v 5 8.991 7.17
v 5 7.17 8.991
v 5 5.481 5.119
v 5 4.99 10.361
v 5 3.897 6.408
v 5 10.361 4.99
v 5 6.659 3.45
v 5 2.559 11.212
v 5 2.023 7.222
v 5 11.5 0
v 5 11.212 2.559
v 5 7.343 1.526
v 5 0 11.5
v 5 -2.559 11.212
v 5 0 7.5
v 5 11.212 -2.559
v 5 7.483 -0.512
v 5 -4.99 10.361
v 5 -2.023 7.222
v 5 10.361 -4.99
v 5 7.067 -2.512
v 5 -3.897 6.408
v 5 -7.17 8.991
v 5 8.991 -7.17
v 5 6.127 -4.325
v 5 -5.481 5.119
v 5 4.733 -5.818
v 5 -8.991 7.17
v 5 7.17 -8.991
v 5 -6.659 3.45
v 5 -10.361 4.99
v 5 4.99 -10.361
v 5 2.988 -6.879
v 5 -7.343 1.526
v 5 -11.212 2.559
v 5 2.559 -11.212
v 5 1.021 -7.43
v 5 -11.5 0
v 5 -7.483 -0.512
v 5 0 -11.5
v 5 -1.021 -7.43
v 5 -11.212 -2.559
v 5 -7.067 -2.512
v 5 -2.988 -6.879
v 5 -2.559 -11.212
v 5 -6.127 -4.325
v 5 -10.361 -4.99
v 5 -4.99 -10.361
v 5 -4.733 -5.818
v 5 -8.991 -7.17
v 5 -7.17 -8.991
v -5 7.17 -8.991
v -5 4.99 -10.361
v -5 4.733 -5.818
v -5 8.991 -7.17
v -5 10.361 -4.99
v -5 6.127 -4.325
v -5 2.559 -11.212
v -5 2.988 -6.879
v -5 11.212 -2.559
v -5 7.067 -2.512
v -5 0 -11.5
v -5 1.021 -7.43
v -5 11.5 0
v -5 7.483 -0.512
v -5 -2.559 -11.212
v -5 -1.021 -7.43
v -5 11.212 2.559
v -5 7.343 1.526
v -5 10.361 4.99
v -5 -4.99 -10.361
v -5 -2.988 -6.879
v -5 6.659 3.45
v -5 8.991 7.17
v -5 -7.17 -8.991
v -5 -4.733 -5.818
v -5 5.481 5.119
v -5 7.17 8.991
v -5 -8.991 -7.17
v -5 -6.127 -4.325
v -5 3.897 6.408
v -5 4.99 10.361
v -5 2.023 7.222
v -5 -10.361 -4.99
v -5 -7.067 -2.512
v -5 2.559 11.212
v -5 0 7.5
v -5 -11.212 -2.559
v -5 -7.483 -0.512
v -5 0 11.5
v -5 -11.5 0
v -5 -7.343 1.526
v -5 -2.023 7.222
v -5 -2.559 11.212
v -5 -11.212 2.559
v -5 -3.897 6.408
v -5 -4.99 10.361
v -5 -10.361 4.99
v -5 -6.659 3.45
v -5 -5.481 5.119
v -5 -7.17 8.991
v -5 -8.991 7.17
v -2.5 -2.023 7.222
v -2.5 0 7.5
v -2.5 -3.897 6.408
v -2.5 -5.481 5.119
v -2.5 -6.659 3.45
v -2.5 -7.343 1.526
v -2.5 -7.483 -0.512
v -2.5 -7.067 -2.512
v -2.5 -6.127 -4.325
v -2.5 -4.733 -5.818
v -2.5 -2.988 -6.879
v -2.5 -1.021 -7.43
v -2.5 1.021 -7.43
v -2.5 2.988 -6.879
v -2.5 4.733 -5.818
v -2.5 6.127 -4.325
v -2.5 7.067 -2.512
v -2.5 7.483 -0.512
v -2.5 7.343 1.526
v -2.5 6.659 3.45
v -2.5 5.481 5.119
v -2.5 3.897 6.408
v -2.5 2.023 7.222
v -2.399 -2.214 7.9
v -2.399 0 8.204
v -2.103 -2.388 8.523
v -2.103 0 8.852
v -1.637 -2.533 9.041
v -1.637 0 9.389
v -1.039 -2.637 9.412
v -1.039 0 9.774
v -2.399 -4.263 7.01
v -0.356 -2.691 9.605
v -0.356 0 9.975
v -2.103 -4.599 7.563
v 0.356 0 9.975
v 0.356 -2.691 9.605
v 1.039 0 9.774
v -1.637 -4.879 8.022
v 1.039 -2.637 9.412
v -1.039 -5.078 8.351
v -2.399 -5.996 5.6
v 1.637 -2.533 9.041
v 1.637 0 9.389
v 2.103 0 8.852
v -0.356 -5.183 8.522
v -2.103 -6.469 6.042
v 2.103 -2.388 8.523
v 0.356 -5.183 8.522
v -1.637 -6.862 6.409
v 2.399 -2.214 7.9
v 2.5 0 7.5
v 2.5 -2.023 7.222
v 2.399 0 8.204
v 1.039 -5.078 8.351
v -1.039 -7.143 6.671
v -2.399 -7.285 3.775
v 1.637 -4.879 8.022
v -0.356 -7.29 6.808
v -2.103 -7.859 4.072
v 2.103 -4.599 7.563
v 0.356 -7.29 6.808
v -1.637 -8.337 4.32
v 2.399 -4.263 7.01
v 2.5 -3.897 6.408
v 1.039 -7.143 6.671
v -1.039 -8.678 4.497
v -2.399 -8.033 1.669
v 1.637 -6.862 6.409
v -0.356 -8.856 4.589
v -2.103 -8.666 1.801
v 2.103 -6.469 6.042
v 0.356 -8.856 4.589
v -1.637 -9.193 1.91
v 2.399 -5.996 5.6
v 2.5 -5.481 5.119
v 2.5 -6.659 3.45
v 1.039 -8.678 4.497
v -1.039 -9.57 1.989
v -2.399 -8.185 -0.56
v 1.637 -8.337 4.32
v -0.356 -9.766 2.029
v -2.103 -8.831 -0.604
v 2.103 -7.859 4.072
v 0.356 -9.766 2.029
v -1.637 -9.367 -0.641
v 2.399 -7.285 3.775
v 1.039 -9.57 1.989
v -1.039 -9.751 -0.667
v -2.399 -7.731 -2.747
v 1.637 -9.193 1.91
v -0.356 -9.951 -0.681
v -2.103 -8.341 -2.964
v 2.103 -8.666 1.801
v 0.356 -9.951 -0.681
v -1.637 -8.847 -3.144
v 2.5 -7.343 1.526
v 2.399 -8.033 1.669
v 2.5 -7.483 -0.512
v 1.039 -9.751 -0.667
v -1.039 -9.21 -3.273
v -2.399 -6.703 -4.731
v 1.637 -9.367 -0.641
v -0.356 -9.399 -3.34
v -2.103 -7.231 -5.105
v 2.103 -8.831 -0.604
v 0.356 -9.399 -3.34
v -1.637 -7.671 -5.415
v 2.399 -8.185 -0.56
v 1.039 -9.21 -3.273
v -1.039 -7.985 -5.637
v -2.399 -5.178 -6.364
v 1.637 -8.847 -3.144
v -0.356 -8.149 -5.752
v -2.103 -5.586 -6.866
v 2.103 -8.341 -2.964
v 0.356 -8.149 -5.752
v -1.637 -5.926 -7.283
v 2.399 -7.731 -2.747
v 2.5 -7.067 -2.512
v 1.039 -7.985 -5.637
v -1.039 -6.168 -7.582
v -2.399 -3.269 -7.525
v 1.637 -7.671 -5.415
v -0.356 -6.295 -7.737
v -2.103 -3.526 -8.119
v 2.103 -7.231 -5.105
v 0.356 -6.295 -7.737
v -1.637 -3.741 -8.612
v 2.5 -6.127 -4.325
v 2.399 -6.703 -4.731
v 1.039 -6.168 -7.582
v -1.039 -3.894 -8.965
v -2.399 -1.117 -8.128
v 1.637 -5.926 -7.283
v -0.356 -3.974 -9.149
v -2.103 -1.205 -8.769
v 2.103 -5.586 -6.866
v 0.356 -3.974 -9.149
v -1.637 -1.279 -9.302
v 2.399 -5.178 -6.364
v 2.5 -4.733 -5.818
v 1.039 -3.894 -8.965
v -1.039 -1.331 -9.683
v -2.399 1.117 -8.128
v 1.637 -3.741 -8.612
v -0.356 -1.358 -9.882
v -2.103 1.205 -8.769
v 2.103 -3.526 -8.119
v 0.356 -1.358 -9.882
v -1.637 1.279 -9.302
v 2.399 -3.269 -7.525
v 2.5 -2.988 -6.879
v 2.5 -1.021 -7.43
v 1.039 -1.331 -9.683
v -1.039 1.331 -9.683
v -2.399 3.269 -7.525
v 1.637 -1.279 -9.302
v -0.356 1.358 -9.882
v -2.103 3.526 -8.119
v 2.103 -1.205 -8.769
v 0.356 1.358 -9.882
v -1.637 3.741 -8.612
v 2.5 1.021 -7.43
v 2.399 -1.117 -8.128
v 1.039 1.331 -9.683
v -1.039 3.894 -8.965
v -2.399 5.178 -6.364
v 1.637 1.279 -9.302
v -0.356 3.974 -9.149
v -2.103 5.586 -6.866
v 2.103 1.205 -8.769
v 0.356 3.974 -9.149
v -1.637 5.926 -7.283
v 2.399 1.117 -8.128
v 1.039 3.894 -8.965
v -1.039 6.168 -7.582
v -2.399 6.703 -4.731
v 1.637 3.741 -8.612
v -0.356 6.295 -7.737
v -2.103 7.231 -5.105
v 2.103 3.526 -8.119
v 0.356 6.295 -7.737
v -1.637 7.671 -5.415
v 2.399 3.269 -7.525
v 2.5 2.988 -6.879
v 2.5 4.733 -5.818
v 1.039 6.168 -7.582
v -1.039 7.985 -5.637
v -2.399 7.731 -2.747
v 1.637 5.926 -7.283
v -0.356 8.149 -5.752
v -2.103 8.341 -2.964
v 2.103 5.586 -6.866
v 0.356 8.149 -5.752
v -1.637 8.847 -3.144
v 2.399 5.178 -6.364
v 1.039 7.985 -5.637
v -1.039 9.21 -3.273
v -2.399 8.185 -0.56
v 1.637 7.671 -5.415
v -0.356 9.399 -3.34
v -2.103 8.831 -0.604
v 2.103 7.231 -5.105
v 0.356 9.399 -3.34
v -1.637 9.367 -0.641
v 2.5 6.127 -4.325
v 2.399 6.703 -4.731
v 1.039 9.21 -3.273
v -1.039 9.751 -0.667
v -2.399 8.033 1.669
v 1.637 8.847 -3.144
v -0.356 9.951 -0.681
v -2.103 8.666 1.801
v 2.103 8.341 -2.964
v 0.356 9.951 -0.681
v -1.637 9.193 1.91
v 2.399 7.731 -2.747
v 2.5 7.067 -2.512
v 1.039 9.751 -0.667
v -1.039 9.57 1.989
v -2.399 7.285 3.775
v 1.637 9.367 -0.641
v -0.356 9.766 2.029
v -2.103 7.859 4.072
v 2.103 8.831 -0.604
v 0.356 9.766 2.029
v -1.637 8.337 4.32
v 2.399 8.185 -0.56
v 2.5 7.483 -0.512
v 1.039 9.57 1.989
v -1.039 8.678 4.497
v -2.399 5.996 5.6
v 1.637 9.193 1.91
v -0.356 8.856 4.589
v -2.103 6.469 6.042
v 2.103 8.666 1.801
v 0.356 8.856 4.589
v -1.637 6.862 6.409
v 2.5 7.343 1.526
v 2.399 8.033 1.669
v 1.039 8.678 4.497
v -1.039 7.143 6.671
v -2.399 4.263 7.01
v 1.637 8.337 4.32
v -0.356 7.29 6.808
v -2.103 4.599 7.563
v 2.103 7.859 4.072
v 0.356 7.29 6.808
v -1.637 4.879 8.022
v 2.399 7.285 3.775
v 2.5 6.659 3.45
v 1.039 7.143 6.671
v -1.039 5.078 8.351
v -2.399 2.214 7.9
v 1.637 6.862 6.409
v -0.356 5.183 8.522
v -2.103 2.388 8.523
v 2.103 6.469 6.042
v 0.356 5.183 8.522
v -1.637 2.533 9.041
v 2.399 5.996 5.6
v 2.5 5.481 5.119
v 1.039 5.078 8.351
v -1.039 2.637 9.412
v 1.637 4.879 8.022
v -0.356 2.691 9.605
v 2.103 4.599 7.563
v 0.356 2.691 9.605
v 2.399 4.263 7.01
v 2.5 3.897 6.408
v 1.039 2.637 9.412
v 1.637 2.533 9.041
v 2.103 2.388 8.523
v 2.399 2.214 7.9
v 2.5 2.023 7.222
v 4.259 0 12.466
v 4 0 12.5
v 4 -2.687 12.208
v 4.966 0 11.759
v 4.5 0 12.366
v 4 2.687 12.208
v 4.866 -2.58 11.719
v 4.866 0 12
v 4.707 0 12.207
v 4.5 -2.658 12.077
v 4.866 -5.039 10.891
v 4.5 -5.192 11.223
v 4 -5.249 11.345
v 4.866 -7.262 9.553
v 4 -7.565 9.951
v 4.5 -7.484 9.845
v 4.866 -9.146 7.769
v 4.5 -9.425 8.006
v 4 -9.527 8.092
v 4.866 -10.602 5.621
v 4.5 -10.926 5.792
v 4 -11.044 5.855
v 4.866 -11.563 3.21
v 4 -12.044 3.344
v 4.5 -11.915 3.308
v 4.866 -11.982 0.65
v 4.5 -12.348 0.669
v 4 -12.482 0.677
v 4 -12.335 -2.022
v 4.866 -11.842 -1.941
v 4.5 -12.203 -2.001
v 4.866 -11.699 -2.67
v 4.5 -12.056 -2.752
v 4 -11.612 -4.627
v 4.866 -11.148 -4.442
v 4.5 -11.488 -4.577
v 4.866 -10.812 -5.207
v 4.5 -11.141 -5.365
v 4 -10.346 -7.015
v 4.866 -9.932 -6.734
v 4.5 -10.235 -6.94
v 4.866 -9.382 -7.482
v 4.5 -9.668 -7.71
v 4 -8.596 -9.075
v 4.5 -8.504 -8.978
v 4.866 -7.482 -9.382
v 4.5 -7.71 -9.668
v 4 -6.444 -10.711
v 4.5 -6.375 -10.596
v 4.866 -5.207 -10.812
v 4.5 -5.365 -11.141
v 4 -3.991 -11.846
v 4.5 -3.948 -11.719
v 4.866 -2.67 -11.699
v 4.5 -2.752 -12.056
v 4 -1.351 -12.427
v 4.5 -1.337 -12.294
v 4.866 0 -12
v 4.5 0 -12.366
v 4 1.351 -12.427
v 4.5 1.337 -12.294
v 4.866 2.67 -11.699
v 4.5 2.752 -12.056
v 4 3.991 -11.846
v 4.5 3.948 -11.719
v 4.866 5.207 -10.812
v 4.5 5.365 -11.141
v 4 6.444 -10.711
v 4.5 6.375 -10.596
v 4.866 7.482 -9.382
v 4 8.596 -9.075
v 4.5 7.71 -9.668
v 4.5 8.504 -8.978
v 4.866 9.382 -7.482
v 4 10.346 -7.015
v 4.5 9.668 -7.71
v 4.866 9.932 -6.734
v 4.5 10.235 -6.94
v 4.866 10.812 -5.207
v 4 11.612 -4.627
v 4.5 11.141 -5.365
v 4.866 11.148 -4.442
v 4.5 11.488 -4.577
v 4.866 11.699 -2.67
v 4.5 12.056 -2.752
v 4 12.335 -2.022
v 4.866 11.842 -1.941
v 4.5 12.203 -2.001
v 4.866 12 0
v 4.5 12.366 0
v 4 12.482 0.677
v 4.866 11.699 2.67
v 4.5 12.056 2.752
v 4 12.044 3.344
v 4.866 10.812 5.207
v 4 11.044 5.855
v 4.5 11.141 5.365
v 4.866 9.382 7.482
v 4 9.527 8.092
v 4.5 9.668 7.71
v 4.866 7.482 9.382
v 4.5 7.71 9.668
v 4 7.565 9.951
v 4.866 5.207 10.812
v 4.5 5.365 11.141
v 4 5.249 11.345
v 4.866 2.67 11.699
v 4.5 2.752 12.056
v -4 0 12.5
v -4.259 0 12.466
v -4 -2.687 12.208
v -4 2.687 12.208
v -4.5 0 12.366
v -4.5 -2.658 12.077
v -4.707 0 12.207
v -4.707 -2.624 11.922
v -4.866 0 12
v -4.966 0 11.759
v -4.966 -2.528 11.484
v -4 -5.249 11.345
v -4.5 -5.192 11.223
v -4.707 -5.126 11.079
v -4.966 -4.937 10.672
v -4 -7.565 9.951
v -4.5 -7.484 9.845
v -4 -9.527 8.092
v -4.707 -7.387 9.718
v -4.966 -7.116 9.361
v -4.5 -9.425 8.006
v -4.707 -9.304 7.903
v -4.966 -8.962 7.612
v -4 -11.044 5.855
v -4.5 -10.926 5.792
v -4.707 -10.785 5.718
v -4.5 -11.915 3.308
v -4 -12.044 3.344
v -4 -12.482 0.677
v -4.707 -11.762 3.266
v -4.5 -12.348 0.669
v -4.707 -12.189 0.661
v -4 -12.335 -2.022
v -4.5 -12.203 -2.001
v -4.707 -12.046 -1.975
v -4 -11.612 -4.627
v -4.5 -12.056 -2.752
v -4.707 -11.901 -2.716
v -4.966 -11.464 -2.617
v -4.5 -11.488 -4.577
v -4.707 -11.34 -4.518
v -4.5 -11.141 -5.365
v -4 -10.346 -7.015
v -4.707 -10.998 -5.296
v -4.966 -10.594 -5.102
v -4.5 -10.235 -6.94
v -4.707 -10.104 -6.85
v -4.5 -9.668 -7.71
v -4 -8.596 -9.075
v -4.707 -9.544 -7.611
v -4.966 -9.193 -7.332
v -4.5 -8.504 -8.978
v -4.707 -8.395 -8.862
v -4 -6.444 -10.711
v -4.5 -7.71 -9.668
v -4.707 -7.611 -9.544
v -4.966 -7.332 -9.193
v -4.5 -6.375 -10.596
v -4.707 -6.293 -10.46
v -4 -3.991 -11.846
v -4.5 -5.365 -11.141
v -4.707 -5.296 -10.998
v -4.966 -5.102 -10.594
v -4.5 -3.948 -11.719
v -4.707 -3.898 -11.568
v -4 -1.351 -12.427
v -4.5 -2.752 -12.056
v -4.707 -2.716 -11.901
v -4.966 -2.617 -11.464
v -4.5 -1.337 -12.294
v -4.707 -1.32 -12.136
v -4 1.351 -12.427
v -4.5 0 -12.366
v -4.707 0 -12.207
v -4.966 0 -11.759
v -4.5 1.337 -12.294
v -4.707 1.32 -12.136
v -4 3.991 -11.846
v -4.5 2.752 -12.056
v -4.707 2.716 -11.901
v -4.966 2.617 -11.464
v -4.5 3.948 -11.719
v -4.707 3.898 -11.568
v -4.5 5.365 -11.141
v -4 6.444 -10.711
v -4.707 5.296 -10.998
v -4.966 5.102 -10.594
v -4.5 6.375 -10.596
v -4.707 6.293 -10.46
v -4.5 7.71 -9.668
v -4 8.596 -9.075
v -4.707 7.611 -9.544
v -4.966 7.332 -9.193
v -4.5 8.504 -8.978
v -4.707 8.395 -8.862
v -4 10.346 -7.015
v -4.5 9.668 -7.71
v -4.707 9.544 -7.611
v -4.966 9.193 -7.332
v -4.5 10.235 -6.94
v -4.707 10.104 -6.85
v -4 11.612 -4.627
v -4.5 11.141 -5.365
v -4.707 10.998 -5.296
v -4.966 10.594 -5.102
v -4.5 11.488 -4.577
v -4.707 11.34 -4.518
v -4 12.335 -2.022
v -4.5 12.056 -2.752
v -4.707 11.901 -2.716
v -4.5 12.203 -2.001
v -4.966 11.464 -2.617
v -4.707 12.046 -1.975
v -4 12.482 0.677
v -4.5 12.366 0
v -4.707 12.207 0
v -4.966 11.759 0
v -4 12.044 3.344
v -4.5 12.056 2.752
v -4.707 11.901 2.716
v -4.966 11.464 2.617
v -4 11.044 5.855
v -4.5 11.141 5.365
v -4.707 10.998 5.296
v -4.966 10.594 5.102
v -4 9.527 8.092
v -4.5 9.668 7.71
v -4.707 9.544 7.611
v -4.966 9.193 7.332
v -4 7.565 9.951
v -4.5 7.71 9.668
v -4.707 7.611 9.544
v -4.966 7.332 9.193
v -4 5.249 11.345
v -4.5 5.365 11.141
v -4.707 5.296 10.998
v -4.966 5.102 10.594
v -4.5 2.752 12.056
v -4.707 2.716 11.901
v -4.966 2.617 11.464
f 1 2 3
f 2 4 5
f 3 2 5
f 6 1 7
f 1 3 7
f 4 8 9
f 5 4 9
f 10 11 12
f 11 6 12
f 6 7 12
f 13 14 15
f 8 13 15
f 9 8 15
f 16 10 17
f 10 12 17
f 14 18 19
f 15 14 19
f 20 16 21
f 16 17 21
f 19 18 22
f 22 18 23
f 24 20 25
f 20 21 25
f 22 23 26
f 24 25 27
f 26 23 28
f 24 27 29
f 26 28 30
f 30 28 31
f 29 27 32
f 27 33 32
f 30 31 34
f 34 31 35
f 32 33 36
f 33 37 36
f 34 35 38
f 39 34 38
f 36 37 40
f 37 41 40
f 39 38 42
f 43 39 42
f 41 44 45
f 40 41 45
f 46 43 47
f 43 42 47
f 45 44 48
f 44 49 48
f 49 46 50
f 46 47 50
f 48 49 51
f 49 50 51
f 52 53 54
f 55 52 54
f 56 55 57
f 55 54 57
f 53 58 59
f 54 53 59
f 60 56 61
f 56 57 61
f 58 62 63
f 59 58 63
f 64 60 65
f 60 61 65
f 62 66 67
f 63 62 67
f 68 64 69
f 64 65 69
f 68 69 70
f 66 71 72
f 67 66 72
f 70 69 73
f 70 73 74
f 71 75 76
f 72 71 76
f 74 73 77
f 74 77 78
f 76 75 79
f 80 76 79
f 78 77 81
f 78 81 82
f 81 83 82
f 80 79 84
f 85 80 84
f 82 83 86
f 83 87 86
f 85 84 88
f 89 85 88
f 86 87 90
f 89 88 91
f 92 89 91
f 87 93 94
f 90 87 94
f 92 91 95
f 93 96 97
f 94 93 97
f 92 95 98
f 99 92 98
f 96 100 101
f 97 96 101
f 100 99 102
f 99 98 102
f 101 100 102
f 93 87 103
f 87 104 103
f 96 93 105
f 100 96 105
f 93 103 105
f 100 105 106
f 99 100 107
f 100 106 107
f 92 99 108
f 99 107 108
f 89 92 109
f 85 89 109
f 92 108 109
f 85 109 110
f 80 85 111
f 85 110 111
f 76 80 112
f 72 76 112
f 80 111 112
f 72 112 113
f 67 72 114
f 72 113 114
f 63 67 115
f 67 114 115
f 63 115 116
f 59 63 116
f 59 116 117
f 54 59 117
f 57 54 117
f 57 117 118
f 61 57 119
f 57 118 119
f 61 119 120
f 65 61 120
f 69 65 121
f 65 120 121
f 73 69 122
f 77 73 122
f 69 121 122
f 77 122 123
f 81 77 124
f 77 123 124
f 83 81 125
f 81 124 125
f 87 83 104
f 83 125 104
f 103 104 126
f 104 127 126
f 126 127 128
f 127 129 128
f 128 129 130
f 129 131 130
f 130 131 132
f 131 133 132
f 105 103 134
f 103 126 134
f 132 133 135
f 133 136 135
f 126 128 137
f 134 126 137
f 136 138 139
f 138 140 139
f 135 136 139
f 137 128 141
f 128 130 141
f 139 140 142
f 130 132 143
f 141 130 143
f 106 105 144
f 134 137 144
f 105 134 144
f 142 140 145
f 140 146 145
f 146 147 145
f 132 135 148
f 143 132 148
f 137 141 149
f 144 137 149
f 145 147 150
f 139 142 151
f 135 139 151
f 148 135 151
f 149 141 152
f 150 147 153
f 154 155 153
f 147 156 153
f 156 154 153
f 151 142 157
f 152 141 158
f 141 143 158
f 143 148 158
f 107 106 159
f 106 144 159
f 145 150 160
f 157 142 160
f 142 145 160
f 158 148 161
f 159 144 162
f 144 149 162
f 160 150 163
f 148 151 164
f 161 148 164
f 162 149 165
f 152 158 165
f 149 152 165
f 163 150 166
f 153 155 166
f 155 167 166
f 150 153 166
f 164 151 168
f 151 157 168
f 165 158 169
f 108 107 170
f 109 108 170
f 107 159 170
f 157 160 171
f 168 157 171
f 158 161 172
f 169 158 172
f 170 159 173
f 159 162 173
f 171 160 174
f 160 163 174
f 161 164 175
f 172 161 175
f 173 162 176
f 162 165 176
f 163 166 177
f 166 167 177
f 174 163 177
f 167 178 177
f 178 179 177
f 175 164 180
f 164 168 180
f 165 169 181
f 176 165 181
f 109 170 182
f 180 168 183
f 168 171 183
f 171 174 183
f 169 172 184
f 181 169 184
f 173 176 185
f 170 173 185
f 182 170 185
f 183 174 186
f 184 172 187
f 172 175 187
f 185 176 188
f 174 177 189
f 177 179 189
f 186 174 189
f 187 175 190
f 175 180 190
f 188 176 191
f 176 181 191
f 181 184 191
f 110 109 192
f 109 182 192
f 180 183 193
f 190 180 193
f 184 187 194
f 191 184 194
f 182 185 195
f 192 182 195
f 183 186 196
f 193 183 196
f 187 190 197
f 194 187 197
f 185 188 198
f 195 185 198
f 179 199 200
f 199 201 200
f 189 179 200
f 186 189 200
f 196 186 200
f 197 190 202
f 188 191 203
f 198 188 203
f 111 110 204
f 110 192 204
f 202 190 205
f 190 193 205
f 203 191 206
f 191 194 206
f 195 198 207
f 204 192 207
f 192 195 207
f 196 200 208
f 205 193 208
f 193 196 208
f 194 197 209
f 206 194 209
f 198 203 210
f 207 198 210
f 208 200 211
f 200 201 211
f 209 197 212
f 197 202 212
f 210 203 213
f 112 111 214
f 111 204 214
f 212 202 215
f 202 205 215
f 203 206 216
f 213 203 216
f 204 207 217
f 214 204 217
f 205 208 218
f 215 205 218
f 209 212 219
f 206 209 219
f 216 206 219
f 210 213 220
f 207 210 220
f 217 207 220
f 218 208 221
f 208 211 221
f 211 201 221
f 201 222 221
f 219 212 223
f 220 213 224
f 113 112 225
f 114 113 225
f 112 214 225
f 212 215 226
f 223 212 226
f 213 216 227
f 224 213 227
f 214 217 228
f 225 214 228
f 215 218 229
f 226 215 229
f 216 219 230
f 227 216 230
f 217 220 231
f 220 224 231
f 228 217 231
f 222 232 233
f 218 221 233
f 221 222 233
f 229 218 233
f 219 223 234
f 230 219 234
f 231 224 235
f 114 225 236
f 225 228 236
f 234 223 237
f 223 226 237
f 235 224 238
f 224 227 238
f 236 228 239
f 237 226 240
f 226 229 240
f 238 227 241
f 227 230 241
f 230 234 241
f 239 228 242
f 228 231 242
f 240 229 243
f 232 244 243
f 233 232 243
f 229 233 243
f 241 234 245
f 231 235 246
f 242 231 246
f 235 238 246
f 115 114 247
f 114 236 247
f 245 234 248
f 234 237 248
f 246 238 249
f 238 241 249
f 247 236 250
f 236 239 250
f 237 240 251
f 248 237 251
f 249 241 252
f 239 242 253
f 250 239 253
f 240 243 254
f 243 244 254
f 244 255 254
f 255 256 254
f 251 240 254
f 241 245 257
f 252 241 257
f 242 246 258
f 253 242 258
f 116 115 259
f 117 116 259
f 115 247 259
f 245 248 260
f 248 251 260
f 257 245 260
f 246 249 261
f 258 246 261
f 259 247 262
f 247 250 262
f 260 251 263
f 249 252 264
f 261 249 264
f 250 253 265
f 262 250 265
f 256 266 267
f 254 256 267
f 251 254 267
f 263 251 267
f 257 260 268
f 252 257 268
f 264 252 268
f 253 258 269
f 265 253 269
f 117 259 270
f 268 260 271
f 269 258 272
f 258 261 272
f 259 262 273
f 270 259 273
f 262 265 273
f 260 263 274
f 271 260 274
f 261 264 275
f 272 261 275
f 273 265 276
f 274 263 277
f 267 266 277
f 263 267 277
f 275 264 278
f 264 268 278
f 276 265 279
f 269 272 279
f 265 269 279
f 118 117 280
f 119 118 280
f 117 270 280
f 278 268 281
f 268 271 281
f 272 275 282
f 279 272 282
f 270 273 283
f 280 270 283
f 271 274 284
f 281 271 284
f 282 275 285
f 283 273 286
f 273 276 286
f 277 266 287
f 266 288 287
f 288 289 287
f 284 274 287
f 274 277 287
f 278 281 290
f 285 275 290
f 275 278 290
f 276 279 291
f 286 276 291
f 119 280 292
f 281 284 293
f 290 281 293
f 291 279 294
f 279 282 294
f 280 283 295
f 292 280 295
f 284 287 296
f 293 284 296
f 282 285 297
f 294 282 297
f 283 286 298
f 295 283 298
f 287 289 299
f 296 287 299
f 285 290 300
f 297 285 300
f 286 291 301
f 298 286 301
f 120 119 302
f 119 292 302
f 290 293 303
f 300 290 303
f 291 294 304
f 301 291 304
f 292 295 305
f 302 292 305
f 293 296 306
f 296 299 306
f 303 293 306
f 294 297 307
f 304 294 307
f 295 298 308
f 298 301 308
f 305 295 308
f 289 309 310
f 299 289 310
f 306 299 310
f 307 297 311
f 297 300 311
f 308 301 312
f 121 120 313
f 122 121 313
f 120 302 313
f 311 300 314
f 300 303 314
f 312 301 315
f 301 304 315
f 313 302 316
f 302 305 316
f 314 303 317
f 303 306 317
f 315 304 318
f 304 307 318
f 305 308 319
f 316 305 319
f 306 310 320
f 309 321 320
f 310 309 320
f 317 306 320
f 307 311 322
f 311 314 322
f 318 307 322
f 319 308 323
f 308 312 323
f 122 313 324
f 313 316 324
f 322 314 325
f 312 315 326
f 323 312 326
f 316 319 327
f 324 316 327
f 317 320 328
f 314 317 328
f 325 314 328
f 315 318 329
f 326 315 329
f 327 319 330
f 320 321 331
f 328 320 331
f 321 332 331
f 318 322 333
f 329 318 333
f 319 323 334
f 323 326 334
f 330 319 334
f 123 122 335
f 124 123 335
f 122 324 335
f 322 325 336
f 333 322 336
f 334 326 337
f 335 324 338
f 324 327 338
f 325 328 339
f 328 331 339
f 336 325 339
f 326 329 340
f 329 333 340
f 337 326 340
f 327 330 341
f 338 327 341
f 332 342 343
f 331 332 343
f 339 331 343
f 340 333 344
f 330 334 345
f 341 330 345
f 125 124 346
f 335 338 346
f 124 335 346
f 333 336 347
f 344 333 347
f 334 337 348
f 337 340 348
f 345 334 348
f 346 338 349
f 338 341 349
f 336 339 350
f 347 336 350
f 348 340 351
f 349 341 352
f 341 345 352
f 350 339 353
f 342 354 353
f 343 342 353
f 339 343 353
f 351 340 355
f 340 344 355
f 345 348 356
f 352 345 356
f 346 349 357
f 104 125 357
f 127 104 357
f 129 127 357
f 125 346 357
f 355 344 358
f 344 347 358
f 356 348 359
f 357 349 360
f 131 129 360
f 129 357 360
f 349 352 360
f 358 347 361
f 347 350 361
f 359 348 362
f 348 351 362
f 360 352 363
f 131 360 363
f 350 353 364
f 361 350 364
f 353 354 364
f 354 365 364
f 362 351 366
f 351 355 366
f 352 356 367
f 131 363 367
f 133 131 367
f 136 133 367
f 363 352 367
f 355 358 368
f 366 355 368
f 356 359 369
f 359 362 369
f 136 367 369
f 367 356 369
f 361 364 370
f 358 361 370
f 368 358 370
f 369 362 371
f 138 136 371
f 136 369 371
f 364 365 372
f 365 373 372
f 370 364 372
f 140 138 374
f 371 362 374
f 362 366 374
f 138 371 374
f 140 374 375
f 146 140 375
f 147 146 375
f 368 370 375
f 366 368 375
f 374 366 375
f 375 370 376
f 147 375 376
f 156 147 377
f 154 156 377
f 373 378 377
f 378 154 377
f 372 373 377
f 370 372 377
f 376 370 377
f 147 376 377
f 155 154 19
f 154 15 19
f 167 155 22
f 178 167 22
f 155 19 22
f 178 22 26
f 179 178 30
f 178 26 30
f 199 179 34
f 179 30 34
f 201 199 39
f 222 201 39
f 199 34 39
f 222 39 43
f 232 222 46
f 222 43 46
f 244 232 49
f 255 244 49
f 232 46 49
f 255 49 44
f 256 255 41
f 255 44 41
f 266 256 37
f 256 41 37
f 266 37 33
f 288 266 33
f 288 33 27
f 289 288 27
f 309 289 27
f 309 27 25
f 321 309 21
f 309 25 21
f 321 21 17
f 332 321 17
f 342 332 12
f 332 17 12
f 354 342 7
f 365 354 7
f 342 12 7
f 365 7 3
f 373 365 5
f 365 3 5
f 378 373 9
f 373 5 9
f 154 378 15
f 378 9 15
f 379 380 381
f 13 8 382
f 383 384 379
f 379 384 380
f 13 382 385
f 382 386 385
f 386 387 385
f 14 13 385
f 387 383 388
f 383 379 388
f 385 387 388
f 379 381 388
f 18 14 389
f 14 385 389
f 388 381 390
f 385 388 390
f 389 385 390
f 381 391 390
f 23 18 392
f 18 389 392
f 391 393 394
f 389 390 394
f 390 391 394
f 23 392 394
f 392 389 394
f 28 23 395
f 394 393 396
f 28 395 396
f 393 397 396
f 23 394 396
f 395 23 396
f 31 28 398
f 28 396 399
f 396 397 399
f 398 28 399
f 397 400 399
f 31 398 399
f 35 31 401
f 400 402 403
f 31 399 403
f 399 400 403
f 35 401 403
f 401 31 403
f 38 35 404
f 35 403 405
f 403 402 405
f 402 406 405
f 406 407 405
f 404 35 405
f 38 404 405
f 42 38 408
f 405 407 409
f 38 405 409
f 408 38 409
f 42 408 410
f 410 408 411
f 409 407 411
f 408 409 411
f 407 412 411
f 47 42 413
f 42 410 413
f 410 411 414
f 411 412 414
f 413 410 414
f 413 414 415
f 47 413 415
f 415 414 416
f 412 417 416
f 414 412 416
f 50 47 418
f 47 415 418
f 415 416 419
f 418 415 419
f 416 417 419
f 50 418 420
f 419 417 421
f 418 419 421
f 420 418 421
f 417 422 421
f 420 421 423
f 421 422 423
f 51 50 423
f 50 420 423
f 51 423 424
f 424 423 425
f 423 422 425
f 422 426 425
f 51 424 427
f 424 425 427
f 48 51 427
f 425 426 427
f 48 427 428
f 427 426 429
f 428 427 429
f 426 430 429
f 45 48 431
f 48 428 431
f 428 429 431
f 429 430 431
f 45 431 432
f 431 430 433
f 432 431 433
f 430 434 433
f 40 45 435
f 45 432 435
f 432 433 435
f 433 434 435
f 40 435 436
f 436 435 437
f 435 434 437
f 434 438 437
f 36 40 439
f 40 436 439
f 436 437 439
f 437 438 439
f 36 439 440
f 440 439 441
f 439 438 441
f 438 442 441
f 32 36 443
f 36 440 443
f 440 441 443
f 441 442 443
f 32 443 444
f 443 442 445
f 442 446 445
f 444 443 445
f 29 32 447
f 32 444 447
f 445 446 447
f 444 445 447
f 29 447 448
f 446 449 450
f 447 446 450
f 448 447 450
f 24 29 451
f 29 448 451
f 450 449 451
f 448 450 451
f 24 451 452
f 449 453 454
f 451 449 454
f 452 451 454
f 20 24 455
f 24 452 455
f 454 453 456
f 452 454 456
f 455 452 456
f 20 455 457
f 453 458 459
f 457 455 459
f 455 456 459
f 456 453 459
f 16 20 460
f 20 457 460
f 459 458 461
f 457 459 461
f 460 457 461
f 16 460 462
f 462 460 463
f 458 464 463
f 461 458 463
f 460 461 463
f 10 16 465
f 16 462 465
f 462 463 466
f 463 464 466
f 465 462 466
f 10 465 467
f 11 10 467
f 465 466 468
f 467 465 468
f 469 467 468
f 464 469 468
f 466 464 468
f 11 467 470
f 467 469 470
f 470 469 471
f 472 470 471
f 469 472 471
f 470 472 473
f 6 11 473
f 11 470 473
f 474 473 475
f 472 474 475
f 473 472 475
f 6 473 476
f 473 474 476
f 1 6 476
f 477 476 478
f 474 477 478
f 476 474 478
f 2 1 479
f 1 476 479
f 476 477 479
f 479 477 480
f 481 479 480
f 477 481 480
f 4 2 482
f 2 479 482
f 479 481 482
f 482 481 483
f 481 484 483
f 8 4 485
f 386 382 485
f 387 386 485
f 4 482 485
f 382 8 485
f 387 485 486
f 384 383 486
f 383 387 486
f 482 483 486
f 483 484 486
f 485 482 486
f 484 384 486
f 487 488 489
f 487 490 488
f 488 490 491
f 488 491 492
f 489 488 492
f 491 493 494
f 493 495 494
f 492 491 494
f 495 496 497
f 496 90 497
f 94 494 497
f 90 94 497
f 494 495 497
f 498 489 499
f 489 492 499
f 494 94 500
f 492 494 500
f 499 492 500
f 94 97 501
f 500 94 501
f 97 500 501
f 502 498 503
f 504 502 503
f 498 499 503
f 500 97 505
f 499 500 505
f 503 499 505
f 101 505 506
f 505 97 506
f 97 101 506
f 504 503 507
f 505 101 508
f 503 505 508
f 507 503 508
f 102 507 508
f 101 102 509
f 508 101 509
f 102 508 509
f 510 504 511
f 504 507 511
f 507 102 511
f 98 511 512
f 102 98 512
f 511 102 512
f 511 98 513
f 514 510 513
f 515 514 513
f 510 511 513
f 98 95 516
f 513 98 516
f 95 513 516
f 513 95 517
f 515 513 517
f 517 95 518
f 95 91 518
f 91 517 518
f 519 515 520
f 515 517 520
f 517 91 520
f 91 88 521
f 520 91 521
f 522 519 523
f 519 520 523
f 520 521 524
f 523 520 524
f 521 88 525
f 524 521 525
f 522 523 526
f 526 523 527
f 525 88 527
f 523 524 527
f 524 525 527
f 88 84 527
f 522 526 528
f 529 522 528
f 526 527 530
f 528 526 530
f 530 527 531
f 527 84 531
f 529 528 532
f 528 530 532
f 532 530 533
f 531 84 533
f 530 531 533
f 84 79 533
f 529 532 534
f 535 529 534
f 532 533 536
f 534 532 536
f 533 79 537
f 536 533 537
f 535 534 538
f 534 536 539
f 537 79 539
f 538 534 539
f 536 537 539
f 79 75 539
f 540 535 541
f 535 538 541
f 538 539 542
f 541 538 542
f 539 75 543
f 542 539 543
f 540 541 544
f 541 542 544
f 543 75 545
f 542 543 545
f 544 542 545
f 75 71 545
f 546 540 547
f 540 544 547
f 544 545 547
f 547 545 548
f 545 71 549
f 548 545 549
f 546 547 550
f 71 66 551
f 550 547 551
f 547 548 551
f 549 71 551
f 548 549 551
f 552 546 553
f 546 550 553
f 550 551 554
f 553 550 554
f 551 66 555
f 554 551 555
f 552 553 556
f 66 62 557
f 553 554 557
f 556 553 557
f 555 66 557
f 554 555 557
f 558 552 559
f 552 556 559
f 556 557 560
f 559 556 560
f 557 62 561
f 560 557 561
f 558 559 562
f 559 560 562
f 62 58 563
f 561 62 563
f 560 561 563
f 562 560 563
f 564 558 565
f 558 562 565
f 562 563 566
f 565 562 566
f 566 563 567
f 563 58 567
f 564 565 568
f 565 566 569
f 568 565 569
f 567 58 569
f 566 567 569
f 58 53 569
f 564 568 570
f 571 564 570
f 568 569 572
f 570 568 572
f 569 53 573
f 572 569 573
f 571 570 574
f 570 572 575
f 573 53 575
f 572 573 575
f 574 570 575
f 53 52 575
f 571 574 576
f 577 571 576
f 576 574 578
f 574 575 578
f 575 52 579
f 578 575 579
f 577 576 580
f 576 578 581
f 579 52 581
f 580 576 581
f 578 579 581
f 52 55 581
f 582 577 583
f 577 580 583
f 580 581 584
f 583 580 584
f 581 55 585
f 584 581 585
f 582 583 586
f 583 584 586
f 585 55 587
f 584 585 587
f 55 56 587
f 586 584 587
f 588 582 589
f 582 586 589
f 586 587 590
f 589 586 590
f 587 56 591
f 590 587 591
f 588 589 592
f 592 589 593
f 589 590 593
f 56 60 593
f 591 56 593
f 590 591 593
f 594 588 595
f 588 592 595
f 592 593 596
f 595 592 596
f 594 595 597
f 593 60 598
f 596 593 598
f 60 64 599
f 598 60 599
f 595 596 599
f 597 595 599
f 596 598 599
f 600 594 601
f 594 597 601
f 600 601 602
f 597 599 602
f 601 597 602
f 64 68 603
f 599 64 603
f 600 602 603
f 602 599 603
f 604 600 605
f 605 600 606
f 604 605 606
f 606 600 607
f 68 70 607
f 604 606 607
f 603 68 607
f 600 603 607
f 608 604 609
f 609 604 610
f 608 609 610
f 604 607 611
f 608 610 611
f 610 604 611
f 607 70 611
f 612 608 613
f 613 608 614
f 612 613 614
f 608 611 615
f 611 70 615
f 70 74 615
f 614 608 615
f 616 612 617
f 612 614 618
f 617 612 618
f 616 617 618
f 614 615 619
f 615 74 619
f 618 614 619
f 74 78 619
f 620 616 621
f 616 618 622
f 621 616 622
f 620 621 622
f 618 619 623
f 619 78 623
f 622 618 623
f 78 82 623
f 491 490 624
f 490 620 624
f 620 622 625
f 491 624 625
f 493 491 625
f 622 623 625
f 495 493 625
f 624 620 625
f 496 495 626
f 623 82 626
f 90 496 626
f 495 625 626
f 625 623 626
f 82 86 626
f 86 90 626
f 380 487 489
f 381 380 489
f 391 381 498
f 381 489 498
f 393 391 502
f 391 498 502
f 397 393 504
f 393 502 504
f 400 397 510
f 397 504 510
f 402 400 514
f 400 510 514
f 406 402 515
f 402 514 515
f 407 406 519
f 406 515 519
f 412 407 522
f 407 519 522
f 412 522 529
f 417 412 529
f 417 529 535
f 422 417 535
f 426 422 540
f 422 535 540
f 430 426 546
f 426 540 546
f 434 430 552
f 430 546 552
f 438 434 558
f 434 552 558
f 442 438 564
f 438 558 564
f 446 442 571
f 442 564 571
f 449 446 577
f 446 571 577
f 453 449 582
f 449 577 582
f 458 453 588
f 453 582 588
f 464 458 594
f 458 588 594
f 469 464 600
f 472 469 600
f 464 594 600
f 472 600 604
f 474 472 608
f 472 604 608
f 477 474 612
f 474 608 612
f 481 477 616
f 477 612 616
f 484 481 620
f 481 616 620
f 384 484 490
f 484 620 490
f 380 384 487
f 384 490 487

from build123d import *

# Parameters (mm, degrees)
FILLET1_R = 1


with BuildPart() as part:
    # Sketch1 → Revolve1 (revolve)
    with BuildSketch(Plane.XY, mode=Mode.PRIVATE) as revolve1_sk:
        with BuildLine():
            Line((2.5, 7.5), (5, 7.5))
            Line((5, 7.5), (5, 12.5))
            Line((5, 12.5), (-5, 12.5))
            Line((-5, 12.5), (-5, 7.5))
            Line((-5, 7.5), (-2.5, 7.5))
            ThreePointArc((-2.5, 7.5), (0, 10), (2.5, 7.5))
        make_face()
    revolve(revolve1_sk.sketch.rotate(Axis((0, 0, 0), (1, 0, 0)), 90), axis=Axis((0, 0, 0), (1, 0, 0)))

    # Fillet1
    fillet1_edges = [part.edges().sort_by_distance(p)[0] for p in [
        (-5, 0, -12.5),
        (5, 0, -12.5),
    ]]
    fillet(fillet1_edges, radius=FILLET1_R)


solid = part.part
